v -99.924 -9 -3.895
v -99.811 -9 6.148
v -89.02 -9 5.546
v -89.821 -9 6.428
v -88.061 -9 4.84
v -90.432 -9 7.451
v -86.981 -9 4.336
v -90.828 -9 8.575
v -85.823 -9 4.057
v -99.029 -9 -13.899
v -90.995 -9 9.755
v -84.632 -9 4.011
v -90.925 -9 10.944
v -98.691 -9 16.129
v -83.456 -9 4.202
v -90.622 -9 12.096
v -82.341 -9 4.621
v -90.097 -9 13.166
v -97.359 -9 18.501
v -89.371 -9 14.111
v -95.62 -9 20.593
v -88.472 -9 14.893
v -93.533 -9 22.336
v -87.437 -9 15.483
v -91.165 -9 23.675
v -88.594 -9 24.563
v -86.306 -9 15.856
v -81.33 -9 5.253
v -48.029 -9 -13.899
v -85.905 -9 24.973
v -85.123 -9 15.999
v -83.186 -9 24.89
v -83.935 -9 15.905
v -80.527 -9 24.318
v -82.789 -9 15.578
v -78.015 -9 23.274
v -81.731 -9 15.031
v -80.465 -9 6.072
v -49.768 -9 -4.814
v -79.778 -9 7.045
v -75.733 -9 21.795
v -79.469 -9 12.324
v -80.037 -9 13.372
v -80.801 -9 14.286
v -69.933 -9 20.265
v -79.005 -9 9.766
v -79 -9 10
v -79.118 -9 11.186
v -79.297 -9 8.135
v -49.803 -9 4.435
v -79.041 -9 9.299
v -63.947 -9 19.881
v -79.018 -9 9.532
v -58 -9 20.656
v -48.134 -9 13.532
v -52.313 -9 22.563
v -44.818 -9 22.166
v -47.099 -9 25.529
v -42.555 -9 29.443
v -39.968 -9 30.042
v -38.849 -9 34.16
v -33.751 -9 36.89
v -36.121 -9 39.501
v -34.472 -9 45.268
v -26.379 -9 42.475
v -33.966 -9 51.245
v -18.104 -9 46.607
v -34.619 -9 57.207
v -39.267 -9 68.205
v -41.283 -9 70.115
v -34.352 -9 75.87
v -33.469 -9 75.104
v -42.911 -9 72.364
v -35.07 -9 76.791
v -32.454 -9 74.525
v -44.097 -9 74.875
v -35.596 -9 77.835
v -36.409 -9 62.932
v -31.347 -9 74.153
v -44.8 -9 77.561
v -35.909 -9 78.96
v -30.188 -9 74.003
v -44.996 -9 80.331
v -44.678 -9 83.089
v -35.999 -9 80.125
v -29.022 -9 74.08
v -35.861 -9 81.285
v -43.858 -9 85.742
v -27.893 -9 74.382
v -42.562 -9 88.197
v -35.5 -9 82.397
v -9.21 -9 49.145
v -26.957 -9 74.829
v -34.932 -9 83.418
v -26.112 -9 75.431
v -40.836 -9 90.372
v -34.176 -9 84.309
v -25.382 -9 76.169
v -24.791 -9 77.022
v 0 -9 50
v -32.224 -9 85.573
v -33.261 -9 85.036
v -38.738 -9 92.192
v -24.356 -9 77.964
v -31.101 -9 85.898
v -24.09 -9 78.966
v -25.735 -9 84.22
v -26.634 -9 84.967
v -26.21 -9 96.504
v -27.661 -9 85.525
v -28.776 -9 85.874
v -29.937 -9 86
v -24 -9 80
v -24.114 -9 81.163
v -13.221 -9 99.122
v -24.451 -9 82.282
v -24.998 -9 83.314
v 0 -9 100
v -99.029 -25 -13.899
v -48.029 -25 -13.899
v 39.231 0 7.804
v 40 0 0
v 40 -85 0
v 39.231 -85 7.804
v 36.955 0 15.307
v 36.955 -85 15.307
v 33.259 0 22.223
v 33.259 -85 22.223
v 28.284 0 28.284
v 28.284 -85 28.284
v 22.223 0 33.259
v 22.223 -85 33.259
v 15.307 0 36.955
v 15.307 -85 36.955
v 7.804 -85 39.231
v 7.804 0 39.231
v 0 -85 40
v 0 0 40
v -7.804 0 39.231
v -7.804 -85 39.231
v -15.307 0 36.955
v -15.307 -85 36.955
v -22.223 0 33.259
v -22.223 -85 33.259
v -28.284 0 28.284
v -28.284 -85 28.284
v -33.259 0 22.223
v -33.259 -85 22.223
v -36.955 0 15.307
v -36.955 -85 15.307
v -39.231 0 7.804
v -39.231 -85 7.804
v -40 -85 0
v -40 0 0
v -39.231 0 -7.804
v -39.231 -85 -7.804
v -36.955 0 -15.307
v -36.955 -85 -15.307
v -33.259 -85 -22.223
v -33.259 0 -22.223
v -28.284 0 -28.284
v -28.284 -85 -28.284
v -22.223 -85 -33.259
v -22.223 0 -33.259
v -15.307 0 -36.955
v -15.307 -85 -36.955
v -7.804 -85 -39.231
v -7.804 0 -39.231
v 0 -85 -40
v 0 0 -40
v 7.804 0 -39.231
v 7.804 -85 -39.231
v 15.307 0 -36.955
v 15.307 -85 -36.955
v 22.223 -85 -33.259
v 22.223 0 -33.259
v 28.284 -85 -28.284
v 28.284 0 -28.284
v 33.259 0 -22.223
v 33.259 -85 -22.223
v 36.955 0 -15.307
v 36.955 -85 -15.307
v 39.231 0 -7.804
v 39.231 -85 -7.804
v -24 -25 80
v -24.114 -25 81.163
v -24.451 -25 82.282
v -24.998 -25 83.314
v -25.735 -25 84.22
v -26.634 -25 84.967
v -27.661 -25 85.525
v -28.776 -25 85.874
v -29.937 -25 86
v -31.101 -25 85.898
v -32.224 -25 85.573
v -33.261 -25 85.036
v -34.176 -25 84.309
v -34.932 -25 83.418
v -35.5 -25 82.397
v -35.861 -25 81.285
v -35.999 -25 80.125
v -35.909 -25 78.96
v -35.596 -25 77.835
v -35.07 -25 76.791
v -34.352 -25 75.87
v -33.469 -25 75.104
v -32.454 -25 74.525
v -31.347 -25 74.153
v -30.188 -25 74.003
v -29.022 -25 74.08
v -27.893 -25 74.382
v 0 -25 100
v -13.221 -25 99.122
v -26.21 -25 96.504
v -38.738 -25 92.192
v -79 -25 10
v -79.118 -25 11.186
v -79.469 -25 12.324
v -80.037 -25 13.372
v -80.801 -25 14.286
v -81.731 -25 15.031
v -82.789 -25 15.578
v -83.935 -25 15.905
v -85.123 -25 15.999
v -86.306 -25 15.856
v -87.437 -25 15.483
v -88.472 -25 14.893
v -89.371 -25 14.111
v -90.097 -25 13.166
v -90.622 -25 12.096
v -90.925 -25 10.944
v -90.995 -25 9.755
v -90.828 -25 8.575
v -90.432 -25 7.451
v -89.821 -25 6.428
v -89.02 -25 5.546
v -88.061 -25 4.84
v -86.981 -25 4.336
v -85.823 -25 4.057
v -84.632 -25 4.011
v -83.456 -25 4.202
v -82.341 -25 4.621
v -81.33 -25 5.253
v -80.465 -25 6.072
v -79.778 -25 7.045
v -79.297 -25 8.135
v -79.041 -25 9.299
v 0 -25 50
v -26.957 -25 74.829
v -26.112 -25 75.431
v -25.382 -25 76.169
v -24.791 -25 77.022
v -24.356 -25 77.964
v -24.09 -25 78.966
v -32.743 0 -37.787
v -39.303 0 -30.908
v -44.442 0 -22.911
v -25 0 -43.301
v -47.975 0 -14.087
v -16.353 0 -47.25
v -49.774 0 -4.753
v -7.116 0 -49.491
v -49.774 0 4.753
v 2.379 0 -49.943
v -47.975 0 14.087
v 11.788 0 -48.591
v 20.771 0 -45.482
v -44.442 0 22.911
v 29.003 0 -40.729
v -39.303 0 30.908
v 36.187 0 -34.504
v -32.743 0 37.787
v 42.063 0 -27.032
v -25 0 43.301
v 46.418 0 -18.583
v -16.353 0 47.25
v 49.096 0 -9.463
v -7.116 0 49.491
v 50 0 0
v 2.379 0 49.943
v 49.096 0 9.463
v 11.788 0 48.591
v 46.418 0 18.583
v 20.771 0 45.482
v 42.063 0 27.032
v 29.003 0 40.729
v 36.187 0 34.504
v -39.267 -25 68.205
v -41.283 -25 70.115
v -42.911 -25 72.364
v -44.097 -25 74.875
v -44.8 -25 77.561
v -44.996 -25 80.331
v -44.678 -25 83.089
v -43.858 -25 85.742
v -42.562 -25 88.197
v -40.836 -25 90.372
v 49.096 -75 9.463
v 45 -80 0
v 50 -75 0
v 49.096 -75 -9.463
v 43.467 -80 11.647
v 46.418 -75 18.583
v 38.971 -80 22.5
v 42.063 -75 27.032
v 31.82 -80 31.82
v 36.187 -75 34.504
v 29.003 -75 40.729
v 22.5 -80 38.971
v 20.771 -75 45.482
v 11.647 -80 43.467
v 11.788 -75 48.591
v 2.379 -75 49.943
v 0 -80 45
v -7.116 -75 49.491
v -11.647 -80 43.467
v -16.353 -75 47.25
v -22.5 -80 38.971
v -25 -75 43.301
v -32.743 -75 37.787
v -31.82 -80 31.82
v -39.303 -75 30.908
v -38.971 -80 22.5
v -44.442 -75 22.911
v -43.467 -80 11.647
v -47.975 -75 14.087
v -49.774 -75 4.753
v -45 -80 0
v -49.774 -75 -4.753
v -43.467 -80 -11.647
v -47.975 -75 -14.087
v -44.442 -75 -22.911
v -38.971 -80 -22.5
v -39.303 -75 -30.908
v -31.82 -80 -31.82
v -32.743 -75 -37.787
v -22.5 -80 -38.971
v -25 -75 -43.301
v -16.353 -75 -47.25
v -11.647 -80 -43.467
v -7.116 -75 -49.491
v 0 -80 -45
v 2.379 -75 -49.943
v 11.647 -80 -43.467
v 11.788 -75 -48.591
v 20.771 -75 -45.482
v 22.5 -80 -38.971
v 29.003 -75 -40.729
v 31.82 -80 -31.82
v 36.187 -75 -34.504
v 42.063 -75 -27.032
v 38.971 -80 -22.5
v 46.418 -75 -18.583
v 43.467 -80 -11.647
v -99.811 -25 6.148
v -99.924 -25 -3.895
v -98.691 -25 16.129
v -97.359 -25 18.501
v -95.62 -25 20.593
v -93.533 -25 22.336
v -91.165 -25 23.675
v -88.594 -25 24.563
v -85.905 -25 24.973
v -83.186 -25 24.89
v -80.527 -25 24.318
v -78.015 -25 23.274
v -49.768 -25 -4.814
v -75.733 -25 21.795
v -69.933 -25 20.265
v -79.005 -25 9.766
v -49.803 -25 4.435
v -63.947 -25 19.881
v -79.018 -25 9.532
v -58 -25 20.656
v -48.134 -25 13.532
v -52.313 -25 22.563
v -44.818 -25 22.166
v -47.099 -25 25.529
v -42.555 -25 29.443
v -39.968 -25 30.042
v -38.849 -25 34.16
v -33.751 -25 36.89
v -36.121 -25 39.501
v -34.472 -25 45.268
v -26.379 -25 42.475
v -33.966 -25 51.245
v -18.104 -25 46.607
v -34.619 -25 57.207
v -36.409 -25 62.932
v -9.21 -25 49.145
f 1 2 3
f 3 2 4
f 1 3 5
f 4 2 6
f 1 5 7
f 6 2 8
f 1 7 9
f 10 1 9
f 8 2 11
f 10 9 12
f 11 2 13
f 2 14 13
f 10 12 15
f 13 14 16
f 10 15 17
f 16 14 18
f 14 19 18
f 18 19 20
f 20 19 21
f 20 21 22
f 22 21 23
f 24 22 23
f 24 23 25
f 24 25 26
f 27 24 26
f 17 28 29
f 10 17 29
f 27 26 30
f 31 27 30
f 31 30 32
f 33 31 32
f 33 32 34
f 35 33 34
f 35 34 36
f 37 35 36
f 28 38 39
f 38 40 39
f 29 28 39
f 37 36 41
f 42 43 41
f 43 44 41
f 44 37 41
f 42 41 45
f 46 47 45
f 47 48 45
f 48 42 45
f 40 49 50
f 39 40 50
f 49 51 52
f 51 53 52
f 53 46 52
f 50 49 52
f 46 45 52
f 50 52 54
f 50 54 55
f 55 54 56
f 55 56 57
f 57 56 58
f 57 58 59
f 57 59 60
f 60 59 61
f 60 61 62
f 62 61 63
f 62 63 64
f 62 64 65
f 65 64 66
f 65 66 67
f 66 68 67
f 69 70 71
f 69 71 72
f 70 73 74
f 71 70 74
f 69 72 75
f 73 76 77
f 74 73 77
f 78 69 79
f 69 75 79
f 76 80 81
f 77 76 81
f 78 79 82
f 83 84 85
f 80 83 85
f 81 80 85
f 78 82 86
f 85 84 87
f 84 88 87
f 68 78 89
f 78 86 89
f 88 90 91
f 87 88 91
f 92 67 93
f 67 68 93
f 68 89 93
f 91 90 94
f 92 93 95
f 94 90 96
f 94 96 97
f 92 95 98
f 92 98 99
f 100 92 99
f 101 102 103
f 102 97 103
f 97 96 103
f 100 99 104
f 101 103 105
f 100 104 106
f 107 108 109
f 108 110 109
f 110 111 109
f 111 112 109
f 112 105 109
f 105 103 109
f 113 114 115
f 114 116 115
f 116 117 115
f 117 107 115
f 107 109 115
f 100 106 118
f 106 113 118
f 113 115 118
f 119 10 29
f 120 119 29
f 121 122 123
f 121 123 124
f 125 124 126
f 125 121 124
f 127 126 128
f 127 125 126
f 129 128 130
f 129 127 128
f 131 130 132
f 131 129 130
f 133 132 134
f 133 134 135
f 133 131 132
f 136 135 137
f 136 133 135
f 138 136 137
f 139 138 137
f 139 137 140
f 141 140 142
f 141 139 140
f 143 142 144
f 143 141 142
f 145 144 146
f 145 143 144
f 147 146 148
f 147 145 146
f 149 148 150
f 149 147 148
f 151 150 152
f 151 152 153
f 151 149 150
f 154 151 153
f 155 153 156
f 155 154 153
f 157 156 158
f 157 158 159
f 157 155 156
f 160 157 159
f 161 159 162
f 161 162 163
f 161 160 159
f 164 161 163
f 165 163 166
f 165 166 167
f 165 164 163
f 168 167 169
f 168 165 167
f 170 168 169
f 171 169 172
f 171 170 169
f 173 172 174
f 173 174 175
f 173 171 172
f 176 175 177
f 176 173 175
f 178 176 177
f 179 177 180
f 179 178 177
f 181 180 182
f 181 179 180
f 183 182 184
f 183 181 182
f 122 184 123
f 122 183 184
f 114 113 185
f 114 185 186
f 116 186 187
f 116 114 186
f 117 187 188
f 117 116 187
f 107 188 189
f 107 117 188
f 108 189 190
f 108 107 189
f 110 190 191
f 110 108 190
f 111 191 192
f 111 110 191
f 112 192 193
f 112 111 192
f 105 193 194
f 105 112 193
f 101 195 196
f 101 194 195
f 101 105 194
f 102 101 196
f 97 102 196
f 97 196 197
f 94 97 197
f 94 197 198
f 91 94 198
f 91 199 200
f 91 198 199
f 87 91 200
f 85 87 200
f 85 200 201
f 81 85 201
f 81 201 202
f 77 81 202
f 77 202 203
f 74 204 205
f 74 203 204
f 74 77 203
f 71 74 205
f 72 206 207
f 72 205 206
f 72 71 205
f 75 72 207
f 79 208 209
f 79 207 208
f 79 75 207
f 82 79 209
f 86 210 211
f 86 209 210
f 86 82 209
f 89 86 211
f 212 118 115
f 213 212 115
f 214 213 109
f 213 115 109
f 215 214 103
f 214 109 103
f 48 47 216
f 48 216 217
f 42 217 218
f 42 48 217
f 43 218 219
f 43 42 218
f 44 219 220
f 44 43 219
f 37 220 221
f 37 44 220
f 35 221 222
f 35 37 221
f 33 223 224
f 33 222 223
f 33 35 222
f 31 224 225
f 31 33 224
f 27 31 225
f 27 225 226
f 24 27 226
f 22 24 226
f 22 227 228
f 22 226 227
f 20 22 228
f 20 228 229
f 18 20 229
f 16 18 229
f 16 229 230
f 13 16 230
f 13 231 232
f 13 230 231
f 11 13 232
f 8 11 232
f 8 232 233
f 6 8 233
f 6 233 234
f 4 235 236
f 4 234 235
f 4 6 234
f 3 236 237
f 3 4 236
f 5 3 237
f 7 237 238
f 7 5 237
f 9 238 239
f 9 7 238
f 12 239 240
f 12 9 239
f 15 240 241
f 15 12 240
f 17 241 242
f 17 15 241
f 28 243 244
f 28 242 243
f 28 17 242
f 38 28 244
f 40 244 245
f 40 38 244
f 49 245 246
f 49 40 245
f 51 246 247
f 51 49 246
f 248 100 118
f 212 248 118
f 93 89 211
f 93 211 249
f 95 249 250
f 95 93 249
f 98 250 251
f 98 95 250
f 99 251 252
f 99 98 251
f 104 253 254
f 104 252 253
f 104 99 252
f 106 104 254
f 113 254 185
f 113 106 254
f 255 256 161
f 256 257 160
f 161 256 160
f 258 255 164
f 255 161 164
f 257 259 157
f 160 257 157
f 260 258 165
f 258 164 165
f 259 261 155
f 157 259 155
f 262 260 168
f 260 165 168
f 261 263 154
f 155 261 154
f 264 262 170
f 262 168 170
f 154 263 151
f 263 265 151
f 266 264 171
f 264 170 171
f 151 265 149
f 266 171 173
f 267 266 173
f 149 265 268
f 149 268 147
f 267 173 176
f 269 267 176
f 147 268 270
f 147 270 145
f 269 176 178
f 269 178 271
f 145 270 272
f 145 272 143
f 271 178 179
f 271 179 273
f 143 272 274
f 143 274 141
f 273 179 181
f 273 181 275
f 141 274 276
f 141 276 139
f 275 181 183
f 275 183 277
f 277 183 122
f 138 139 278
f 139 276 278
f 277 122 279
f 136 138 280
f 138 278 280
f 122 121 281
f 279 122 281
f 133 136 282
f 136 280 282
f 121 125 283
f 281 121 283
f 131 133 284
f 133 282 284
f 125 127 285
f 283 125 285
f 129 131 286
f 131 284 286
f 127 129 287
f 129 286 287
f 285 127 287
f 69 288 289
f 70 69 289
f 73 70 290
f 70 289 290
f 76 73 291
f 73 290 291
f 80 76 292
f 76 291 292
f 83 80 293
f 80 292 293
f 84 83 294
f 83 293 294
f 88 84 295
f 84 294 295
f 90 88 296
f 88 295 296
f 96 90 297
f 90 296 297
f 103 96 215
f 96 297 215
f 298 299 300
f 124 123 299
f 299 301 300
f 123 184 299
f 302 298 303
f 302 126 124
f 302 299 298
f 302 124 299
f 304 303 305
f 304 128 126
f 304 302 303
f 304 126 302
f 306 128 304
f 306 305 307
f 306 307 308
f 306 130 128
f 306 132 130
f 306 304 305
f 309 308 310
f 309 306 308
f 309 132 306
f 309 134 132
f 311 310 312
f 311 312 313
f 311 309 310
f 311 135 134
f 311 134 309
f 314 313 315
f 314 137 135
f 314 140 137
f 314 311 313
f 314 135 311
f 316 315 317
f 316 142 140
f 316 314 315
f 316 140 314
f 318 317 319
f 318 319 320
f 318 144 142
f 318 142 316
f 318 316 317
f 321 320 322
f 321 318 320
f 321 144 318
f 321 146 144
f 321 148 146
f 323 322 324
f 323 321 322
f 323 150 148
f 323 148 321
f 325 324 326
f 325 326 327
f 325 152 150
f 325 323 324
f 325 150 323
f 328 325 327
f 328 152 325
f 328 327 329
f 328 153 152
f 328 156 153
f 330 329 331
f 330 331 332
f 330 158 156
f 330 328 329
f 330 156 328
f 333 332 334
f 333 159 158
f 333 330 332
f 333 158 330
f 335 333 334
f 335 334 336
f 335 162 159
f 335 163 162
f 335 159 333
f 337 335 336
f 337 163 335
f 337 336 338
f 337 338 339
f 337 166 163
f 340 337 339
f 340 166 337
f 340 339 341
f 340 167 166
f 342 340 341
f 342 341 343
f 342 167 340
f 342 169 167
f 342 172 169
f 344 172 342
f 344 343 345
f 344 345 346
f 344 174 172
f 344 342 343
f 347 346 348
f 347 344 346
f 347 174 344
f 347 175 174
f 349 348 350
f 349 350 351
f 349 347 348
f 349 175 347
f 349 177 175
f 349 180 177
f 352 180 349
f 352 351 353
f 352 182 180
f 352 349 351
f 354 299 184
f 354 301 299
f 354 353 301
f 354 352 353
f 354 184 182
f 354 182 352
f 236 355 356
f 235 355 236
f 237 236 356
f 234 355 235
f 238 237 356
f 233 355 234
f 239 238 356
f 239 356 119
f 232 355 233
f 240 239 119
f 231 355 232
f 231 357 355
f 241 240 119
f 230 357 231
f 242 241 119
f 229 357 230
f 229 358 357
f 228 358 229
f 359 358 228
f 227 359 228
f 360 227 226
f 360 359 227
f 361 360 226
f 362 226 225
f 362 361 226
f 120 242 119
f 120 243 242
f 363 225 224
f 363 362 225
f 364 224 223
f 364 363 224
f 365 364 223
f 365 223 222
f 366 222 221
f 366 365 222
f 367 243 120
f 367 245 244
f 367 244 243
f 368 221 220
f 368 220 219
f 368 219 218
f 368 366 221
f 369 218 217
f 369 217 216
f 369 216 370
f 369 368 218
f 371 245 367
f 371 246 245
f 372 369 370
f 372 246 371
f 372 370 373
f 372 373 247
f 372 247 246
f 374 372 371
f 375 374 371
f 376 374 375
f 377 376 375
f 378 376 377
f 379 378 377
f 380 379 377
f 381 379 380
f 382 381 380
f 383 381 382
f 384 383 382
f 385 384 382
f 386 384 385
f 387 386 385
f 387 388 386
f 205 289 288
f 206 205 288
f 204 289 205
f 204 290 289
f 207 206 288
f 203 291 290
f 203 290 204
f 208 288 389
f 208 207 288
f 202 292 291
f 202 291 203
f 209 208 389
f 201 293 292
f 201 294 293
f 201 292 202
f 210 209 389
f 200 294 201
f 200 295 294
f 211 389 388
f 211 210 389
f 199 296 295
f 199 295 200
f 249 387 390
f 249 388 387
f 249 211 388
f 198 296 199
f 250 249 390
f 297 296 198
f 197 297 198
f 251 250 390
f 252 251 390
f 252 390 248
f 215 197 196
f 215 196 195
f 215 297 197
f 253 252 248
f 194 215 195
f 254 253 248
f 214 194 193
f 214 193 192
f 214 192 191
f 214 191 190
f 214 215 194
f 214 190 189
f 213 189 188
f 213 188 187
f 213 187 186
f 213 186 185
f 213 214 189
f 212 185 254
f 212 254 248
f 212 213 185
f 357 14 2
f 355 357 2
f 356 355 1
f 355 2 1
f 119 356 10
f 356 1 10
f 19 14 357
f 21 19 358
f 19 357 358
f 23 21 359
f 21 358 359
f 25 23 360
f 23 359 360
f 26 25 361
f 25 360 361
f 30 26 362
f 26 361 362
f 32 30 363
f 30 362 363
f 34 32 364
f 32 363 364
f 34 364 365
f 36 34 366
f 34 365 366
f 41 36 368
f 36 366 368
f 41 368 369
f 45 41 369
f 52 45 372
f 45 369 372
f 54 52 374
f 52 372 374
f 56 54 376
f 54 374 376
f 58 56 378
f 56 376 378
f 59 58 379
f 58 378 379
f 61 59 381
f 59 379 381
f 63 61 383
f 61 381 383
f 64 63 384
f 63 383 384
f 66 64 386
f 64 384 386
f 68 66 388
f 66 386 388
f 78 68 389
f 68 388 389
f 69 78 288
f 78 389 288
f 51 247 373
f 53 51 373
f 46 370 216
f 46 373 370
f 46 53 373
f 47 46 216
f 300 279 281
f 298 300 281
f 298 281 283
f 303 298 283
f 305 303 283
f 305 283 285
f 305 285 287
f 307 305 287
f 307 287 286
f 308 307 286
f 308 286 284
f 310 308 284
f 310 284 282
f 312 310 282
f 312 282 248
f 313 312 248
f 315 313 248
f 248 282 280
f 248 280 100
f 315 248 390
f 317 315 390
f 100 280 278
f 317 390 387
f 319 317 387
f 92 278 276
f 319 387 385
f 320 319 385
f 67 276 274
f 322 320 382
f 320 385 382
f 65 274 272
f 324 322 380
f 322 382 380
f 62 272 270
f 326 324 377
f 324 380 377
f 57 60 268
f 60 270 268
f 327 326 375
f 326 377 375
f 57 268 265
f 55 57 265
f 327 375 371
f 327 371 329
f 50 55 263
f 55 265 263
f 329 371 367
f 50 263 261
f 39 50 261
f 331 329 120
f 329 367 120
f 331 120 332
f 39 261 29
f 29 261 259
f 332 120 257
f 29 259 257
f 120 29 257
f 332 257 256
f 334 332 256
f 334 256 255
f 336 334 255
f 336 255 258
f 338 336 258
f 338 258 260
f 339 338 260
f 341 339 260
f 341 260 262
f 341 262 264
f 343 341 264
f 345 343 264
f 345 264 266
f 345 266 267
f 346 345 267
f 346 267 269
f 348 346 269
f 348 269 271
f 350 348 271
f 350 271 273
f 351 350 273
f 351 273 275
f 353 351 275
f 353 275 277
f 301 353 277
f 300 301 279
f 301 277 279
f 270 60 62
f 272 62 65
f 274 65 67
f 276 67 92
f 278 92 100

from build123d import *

# Parameters (mm, degrees)
F0_R     = 50
F0_R_2   = 40
F1_DEPTH = 85
F4_DEPTH = 16
F6_DEPTH = 18
F8_DEPTH = 17
F9_SIZE  = 9.99999


# Not quite as in the source:
# - a fillet or chamfer is up to 0.001 mm smaller than in the source, because OpenCascade refuses the exact size
# - a feature names something its author has since deleted; it is built from what else it names


with BuildPart() as f1:
    # F0 (on Front) → F1 (new body)
    with BuildSketch(Plane.XZ):
        Circle(F0_R)
        Circle(F0_R_2, mode=Mode.SUBTRACT)
    extrude(amount=F1_DEPTH)

    # F3 (on offset) → F4 (join)
    with BuildSketch(Plane.XZ.offset(9)):
        with BuildLine():
            ThreePointArc((-48.0294117647, -13.898762734), (-39.9683508335, 30.0421525802), (0, 50))
            Line((0, 50), (0, 100))
            ThreePointArc((0, 100), (-75.4648138983, 65.6129702368), (-99.0294117647, -13.898762734))
            Line((-99.0294117647, -13.898762734), (-48.0294117647, -13.898762734))
        make_face()
    extrude(amount=F4_DEPTH)

    # F5 (on offset) → F6 (cut)
    with BuildSketch(Plane.XZ.offset(9)):
        with BuildLine():
            ThreePointArc((-24, 80), (-34.9315537053, 83.4175690266), (-27.8932593505, 74.3820249346))
            ThreePointArc((-27.8932593505, 74.3820249346), (-25.0684462947, 76.5824309734), (-24, 80))
        make_face()
        with BuildLine():
            ThreePointArc((-79, 10), (-90.989717095, 10.3511255077), (-79.0410963741, 9.2989525146))
            ThreePointArc((-79.0410963741, 9.2989525146), (-79.010282905, 9.6488744923), (-79, 10))
        make_face()
    extrude(amount=F6_DEPTH, mode=Mode.SUBTRACT)

    # F7 (on face) → F8 (cut)
    with BuildSketch(Plane.XZ.offset(25)):
        with BuildLine():
            ThreePointArc((-75.732676721, 21.7947750823), (-40.5874083787, 31.7115351547), (-39.267323279, 68.2052249177))
            ThreePointArc((-39.267323279, 68.2052249177), (-44.9963531804, 80.3307435394), (-38.7382990756, 92.1918878466))
            ThreePointArc((-38.7382990756, 92.1918878466), (-78.5370863203, 61.9025530355), (-98.6907067749, 16.1289924134))
            ThreePointArc((-98.6907067749, 16.1289924134), (-88.5940024625, 24.5630747543), (-75.732676721, 21.7947750823))
        make_face()
    extrude(amount=-F8_DEPTH, mode=Mode.SUBTRACT)

    # F9 (size 10 in the source; OpenCascade refuses exactly that, so slightly less here)
    f9_edges = [f1.edges().sort_by_distance(p)[0] for p in [
        (-50, -85, 0),
    ]]
    chamfer(f9_edges, length=F9_SIZE)


solid = f1.part
